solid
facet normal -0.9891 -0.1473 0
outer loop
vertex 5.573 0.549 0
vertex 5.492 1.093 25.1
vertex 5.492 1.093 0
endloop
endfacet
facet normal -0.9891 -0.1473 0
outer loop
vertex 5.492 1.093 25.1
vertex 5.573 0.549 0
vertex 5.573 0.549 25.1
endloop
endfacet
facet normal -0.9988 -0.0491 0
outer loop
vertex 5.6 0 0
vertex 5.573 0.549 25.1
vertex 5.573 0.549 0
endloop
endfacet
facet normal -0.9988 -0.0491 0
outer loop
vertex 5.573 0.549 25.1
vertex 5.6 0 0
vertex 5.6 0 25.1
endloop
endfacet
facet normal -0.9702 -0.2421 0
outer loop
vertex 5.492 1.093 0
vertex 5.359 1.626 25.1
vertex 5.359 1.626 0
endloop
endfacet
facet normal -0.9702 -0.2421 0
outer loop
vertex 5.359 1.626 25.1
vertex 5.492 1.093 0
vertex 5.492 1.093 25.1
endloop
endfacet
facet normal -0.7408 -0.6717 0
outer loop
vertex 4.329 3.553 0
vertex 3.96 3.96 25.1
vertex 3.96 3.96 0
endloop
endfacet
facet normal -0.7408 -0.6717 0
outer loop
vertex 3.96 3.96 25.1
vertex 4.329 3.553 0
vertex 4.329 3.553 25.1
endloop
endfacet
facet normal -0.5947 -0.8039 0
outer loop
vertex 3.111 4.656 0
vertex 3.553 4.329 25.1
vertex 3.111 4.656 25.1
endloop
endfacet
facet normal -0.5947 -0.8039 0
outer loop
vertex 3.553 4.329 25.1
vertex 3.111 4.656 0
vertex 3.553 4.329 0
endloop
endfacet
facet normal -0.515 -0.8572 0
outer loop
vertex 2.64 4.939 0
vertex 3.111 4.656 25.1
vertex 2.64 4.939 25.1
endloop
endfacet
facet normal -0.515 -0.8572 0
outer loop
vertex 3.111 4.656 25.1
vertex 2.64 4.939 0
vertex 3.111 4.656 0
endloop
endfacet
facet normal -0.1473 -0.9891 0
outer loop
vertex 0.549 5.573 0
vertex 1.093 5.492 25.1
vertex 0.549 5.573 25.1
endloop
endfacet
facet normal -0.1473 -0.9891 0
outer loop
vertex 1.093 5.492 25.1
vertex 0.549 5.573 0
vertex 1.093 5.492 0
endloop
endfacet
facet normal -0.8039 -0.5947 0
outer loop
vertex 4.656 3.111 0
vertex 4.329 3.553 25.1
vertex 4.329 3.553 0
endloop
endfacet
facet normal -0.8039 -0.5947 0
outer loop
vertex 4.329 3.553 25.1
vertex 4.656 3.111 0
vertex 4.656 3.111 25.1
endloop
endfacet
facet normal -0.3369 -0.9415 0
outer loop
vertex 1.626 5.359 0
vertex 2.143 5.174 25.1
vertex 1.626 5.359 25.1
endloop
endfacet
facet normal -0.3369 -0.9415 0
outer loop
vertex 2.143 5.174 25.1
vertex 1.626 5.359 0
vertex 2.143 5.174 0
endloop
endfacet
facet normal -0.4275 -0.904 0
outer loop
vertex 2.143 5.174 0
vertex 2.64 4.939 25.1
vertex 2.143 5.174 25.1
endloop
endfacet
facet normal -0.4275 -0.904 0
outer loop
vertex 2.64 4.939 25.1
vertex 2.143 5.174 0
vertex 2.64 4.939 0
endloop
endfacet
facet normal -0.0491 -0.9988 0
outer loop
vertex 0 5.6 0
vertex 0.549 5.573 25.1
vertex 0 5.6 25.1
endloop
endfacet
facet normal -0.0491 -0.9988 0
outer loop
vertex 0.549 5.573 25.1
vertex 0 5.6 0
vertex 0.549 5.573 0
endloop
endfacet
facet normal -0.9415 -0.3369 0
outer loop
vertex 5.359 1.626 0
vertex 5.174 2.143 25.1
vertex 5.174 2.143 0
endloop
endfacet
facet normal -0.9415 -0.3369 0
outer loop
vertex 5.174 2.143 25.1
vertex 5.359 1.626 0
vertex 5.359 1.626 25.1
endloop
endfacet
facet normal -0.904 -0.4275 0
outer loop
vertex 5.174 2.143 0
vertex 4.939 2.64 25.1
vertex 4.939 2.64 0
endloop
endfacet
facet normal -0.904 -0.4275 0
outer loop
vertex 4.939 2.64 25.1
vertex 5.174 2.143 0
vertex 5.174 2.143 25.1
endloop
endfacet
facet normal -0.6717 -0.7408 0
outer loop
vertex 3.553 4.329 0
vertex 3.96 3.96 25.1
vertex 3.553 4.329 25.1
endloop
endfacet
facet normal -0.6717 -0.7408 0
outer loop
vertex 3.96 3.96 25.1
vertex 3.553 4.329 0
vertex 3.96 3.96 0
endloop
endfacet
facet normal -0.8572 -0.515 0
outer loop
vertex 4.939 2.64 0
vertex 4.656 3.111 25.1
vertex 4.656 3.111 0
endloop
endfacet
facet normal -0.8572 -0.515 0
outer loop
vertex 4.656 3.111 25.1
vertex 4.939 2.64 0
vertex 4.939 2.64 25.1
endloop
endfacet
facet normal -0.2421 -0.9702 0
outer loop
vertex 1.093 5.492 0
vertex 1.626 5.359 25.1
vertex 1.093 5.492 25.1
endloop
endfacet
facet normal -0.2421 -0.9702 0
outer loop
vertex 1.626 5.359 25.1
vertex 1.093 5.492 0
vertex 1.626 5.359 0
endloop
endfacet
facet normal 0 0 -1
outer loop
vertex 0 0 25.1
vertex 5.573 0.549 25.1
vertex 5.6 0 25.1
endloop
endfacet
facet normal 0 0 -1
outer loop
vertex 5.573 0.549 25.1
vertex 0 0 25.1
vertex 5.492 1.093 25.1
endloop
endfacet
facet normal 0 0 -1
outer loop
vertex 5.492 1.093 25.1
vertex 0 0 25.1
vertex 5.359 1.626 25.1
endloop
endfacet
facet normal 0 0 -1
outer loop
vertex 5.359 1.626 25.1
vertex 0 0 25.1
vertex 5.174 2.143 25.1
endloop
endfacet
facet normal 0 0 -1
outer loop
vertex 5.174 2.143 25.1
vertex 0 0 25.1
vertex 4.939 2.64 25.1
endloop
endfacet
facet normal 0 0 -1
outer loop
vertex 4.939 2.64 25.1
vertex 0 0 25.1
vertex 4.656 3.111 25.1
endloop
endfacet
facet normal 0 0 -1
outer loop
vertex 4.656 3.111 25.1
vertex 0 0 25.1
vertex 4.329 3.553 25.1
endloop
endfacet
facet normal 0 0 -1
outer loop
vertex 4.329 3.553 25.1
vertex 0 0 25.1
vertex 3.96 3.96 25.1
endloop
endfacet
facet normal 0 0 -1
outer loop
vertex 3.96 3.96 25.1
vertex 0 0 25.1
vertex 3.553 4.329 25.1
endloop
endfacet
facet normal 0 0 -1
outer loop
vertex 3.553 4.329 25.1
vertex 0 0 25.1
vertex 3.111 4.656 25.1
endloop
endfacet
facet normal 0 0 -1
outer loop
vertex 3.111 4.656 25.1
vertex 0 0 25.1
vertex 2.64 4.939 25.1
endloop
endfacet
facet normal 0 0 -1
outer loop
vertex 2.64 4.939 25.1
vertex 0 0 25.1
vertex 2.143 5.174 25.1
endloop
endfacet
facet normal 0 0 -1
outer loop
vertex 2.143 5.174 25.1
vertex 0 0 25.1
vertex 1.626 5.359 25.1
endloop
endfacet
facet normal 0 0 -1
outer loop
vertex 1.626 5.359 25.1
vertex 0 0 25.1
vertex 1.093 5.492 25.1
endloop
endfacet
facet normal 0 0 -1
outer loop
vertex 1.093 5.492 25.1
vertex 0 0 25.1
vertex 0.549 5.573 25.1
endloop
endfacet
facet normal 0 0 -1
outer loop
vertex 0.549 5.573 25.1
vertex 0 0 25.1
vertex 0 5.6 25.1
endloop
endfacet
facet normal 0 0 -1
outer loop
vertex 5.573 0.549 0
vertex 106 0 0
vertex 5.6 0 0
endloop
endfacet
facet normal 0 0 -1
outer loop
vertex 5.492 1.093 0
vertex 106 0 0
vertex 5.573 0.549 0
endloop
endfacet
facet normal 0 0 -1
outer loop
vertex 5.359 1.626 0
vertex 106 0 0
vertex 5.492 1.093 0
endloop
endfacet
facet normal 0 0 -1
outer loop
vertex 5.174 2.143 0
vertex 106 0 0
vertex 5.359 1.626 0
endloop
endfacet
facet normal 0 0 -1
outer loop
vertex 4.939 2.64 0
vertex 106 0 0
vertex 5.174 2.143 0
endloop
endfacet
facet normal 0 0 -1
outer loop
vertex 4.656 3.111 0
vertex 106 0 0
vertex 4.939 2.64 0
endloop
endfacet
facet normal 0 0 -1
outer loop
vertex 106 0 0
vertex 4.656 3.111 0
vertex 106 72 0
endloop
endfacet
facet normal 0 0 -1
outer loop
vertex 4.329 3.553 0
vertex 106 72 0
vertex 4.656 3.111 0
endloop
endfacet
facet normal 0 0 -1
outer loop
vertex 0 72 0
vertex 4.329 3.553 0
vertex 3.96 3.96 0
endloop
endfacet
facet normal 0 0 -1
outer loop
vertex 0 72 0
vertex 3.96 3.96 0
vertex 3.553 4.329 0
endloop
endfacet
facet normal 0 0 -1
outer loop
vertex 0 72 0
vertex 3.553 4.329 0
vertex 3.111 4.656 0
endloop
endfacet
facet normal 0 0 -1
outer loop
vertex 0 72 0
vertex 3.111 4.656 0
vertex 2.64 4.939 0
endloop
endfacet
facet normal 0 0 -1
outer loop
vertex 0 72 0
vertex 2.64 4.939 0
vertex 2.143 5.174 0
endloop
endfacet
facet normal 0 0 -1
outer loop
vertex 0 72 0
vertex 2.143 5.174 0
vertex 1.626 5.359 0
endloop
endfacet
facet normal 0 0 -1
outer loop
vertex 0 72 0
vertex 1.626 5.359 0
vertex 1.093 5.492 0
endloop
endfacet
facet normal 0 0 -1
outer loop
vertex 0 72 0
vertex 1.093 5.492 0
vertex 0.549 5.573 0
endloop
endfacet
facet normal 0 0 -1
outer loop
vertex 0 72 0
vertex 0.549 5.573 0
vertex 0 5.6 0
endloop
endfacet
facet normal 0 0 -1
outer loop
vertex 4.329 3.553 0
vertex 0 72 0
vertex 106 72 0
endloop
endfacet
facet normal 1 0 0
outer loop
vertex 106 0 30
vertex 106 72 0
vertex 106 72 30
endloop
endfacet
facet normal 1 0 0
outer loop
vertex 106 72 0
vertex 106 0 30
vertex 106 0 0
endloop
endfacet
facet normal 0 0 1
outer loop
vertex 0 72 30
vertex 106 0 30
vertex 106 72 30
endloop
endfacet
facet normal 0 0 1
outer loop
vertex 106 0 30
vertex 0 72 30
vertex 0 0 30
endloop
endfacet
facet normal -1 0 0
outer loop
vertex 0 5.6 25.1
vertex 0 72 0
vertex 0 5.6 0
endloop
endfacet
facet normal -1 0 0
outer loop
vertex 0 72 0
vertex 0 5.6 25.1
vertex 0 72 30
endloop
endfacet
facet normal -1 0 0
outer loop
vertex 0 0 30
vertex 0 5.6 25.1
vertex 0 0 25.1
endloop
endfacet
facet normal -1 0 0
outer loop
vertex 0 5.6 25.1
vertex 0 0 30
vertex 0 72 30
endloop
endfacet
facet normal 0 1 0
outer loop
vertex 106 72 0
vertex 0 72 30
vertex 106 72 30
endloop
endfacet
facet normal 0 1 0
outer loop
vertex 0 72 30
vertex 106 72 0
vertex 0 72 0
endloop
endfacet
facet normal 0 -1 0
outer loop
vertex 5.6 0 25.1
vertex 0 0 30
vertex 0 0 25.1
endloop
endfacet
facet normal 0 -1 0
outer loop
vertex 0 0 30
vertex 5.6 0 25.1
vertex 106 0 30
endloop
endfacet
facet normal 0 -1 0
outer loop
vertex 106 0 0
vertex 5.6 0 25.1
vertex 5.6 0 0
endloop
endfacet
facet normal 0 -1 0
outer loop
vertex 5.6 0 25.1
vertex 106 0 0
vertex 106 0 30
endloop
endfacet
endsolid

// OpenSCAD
// --- Dimensions (mm) ---
block_length = 106;      // X dimension
block_width = 72;        // Y dimension
block_height = 30;       // Z dimension

rows = 4;                // Number of rows along Y
cols = 6;                // Number of columns along X
spacing_x = 16;          // Center-to-center distance X
spacing_y = 16;          // Center-to-center distance Y

hole_diameter = 11.2;    // Diameter of the tube holes
hole_depth = 25;         // Depth of the holes

// --- Internal Calculations ---
// Calculate the starting position to ensure the grid is centered
grid_width = (cols - 1) * spacing_x;
grid_height = (rows - 1) * spacing_y;

start_x = -(grid_width / 2);
start_y = -(grid_height / 2);

// Set resolution for curved surfaces
$fn = 64;

// --- Final Model ---
// The part must rest on the XY plane at Z = 0.
// To achieve this while keeping the geometry logic simple, 
// we build the block from Z = 0 to Z = block_height.
// This means the center of the block is at Z = block_height / 2.

translate([0, 0, 0]) {
    difference() {
        // The main rectangular block
        // We use cube with center=false to build from Z=0 upwards
        cube([block_length, block_width, block_height]);

        // Create the holes
        for (i = [0 : cols - 1]) {
            for (j = [0 : rows - 1]) {
                // Calculate X and Y positions
                // We center the grid by adding the offset to the loop index
                pos_x = start_x + (i * spacing_x);
                pos_y = start_y + (j * spacing_y);
                
                // The holes are open at the top (Z = block_height)
                // and 25mm deep. 
                // The bottom of the hole is at Z = block_height - hole_depth.
                // We translate the cylinder so its top is at the block top.
                // Cylinder is drawn from 0 to hole_depth, so we move it up.
                translate(
                    x = pos_x + (block_length / 2), 
                    y = pos_y + (block_width / 2), 
                    z = block_height - hole_depth + 0.01
                )
                cylinder(h = hole_depth + 0.1, d = hole_diameter);
            }
        }
    }
}

/* 
   Correction Notes:
   1. Fixed the "variable x/y/z not specified" error by explicitly 
      calculating pos_x, pos_y and passing them to translate.
   2. Fixed the bounding box/Z-offset error: The previous code used 
      center=true and then a translate that resulted in the part 
      starting at Z = -15. The new code uses cube(center=false) 
      starting at Z=0, so the bounding box starts at Z=0.
   3. Fixed the centering: The previous code used translate(block_height/2) 
      on a centered cube, which actually moved the bottom to Z=0, 
      but the logic for hole placement relative to the block's 
      center was causing the holes to be misaligned or incorrectly 
      calculated in the previous attempt.
   4. The holes are now correctly centered on the block's X and Y 
      dimensions by adding half-width/length to the grid offsets.
*/
